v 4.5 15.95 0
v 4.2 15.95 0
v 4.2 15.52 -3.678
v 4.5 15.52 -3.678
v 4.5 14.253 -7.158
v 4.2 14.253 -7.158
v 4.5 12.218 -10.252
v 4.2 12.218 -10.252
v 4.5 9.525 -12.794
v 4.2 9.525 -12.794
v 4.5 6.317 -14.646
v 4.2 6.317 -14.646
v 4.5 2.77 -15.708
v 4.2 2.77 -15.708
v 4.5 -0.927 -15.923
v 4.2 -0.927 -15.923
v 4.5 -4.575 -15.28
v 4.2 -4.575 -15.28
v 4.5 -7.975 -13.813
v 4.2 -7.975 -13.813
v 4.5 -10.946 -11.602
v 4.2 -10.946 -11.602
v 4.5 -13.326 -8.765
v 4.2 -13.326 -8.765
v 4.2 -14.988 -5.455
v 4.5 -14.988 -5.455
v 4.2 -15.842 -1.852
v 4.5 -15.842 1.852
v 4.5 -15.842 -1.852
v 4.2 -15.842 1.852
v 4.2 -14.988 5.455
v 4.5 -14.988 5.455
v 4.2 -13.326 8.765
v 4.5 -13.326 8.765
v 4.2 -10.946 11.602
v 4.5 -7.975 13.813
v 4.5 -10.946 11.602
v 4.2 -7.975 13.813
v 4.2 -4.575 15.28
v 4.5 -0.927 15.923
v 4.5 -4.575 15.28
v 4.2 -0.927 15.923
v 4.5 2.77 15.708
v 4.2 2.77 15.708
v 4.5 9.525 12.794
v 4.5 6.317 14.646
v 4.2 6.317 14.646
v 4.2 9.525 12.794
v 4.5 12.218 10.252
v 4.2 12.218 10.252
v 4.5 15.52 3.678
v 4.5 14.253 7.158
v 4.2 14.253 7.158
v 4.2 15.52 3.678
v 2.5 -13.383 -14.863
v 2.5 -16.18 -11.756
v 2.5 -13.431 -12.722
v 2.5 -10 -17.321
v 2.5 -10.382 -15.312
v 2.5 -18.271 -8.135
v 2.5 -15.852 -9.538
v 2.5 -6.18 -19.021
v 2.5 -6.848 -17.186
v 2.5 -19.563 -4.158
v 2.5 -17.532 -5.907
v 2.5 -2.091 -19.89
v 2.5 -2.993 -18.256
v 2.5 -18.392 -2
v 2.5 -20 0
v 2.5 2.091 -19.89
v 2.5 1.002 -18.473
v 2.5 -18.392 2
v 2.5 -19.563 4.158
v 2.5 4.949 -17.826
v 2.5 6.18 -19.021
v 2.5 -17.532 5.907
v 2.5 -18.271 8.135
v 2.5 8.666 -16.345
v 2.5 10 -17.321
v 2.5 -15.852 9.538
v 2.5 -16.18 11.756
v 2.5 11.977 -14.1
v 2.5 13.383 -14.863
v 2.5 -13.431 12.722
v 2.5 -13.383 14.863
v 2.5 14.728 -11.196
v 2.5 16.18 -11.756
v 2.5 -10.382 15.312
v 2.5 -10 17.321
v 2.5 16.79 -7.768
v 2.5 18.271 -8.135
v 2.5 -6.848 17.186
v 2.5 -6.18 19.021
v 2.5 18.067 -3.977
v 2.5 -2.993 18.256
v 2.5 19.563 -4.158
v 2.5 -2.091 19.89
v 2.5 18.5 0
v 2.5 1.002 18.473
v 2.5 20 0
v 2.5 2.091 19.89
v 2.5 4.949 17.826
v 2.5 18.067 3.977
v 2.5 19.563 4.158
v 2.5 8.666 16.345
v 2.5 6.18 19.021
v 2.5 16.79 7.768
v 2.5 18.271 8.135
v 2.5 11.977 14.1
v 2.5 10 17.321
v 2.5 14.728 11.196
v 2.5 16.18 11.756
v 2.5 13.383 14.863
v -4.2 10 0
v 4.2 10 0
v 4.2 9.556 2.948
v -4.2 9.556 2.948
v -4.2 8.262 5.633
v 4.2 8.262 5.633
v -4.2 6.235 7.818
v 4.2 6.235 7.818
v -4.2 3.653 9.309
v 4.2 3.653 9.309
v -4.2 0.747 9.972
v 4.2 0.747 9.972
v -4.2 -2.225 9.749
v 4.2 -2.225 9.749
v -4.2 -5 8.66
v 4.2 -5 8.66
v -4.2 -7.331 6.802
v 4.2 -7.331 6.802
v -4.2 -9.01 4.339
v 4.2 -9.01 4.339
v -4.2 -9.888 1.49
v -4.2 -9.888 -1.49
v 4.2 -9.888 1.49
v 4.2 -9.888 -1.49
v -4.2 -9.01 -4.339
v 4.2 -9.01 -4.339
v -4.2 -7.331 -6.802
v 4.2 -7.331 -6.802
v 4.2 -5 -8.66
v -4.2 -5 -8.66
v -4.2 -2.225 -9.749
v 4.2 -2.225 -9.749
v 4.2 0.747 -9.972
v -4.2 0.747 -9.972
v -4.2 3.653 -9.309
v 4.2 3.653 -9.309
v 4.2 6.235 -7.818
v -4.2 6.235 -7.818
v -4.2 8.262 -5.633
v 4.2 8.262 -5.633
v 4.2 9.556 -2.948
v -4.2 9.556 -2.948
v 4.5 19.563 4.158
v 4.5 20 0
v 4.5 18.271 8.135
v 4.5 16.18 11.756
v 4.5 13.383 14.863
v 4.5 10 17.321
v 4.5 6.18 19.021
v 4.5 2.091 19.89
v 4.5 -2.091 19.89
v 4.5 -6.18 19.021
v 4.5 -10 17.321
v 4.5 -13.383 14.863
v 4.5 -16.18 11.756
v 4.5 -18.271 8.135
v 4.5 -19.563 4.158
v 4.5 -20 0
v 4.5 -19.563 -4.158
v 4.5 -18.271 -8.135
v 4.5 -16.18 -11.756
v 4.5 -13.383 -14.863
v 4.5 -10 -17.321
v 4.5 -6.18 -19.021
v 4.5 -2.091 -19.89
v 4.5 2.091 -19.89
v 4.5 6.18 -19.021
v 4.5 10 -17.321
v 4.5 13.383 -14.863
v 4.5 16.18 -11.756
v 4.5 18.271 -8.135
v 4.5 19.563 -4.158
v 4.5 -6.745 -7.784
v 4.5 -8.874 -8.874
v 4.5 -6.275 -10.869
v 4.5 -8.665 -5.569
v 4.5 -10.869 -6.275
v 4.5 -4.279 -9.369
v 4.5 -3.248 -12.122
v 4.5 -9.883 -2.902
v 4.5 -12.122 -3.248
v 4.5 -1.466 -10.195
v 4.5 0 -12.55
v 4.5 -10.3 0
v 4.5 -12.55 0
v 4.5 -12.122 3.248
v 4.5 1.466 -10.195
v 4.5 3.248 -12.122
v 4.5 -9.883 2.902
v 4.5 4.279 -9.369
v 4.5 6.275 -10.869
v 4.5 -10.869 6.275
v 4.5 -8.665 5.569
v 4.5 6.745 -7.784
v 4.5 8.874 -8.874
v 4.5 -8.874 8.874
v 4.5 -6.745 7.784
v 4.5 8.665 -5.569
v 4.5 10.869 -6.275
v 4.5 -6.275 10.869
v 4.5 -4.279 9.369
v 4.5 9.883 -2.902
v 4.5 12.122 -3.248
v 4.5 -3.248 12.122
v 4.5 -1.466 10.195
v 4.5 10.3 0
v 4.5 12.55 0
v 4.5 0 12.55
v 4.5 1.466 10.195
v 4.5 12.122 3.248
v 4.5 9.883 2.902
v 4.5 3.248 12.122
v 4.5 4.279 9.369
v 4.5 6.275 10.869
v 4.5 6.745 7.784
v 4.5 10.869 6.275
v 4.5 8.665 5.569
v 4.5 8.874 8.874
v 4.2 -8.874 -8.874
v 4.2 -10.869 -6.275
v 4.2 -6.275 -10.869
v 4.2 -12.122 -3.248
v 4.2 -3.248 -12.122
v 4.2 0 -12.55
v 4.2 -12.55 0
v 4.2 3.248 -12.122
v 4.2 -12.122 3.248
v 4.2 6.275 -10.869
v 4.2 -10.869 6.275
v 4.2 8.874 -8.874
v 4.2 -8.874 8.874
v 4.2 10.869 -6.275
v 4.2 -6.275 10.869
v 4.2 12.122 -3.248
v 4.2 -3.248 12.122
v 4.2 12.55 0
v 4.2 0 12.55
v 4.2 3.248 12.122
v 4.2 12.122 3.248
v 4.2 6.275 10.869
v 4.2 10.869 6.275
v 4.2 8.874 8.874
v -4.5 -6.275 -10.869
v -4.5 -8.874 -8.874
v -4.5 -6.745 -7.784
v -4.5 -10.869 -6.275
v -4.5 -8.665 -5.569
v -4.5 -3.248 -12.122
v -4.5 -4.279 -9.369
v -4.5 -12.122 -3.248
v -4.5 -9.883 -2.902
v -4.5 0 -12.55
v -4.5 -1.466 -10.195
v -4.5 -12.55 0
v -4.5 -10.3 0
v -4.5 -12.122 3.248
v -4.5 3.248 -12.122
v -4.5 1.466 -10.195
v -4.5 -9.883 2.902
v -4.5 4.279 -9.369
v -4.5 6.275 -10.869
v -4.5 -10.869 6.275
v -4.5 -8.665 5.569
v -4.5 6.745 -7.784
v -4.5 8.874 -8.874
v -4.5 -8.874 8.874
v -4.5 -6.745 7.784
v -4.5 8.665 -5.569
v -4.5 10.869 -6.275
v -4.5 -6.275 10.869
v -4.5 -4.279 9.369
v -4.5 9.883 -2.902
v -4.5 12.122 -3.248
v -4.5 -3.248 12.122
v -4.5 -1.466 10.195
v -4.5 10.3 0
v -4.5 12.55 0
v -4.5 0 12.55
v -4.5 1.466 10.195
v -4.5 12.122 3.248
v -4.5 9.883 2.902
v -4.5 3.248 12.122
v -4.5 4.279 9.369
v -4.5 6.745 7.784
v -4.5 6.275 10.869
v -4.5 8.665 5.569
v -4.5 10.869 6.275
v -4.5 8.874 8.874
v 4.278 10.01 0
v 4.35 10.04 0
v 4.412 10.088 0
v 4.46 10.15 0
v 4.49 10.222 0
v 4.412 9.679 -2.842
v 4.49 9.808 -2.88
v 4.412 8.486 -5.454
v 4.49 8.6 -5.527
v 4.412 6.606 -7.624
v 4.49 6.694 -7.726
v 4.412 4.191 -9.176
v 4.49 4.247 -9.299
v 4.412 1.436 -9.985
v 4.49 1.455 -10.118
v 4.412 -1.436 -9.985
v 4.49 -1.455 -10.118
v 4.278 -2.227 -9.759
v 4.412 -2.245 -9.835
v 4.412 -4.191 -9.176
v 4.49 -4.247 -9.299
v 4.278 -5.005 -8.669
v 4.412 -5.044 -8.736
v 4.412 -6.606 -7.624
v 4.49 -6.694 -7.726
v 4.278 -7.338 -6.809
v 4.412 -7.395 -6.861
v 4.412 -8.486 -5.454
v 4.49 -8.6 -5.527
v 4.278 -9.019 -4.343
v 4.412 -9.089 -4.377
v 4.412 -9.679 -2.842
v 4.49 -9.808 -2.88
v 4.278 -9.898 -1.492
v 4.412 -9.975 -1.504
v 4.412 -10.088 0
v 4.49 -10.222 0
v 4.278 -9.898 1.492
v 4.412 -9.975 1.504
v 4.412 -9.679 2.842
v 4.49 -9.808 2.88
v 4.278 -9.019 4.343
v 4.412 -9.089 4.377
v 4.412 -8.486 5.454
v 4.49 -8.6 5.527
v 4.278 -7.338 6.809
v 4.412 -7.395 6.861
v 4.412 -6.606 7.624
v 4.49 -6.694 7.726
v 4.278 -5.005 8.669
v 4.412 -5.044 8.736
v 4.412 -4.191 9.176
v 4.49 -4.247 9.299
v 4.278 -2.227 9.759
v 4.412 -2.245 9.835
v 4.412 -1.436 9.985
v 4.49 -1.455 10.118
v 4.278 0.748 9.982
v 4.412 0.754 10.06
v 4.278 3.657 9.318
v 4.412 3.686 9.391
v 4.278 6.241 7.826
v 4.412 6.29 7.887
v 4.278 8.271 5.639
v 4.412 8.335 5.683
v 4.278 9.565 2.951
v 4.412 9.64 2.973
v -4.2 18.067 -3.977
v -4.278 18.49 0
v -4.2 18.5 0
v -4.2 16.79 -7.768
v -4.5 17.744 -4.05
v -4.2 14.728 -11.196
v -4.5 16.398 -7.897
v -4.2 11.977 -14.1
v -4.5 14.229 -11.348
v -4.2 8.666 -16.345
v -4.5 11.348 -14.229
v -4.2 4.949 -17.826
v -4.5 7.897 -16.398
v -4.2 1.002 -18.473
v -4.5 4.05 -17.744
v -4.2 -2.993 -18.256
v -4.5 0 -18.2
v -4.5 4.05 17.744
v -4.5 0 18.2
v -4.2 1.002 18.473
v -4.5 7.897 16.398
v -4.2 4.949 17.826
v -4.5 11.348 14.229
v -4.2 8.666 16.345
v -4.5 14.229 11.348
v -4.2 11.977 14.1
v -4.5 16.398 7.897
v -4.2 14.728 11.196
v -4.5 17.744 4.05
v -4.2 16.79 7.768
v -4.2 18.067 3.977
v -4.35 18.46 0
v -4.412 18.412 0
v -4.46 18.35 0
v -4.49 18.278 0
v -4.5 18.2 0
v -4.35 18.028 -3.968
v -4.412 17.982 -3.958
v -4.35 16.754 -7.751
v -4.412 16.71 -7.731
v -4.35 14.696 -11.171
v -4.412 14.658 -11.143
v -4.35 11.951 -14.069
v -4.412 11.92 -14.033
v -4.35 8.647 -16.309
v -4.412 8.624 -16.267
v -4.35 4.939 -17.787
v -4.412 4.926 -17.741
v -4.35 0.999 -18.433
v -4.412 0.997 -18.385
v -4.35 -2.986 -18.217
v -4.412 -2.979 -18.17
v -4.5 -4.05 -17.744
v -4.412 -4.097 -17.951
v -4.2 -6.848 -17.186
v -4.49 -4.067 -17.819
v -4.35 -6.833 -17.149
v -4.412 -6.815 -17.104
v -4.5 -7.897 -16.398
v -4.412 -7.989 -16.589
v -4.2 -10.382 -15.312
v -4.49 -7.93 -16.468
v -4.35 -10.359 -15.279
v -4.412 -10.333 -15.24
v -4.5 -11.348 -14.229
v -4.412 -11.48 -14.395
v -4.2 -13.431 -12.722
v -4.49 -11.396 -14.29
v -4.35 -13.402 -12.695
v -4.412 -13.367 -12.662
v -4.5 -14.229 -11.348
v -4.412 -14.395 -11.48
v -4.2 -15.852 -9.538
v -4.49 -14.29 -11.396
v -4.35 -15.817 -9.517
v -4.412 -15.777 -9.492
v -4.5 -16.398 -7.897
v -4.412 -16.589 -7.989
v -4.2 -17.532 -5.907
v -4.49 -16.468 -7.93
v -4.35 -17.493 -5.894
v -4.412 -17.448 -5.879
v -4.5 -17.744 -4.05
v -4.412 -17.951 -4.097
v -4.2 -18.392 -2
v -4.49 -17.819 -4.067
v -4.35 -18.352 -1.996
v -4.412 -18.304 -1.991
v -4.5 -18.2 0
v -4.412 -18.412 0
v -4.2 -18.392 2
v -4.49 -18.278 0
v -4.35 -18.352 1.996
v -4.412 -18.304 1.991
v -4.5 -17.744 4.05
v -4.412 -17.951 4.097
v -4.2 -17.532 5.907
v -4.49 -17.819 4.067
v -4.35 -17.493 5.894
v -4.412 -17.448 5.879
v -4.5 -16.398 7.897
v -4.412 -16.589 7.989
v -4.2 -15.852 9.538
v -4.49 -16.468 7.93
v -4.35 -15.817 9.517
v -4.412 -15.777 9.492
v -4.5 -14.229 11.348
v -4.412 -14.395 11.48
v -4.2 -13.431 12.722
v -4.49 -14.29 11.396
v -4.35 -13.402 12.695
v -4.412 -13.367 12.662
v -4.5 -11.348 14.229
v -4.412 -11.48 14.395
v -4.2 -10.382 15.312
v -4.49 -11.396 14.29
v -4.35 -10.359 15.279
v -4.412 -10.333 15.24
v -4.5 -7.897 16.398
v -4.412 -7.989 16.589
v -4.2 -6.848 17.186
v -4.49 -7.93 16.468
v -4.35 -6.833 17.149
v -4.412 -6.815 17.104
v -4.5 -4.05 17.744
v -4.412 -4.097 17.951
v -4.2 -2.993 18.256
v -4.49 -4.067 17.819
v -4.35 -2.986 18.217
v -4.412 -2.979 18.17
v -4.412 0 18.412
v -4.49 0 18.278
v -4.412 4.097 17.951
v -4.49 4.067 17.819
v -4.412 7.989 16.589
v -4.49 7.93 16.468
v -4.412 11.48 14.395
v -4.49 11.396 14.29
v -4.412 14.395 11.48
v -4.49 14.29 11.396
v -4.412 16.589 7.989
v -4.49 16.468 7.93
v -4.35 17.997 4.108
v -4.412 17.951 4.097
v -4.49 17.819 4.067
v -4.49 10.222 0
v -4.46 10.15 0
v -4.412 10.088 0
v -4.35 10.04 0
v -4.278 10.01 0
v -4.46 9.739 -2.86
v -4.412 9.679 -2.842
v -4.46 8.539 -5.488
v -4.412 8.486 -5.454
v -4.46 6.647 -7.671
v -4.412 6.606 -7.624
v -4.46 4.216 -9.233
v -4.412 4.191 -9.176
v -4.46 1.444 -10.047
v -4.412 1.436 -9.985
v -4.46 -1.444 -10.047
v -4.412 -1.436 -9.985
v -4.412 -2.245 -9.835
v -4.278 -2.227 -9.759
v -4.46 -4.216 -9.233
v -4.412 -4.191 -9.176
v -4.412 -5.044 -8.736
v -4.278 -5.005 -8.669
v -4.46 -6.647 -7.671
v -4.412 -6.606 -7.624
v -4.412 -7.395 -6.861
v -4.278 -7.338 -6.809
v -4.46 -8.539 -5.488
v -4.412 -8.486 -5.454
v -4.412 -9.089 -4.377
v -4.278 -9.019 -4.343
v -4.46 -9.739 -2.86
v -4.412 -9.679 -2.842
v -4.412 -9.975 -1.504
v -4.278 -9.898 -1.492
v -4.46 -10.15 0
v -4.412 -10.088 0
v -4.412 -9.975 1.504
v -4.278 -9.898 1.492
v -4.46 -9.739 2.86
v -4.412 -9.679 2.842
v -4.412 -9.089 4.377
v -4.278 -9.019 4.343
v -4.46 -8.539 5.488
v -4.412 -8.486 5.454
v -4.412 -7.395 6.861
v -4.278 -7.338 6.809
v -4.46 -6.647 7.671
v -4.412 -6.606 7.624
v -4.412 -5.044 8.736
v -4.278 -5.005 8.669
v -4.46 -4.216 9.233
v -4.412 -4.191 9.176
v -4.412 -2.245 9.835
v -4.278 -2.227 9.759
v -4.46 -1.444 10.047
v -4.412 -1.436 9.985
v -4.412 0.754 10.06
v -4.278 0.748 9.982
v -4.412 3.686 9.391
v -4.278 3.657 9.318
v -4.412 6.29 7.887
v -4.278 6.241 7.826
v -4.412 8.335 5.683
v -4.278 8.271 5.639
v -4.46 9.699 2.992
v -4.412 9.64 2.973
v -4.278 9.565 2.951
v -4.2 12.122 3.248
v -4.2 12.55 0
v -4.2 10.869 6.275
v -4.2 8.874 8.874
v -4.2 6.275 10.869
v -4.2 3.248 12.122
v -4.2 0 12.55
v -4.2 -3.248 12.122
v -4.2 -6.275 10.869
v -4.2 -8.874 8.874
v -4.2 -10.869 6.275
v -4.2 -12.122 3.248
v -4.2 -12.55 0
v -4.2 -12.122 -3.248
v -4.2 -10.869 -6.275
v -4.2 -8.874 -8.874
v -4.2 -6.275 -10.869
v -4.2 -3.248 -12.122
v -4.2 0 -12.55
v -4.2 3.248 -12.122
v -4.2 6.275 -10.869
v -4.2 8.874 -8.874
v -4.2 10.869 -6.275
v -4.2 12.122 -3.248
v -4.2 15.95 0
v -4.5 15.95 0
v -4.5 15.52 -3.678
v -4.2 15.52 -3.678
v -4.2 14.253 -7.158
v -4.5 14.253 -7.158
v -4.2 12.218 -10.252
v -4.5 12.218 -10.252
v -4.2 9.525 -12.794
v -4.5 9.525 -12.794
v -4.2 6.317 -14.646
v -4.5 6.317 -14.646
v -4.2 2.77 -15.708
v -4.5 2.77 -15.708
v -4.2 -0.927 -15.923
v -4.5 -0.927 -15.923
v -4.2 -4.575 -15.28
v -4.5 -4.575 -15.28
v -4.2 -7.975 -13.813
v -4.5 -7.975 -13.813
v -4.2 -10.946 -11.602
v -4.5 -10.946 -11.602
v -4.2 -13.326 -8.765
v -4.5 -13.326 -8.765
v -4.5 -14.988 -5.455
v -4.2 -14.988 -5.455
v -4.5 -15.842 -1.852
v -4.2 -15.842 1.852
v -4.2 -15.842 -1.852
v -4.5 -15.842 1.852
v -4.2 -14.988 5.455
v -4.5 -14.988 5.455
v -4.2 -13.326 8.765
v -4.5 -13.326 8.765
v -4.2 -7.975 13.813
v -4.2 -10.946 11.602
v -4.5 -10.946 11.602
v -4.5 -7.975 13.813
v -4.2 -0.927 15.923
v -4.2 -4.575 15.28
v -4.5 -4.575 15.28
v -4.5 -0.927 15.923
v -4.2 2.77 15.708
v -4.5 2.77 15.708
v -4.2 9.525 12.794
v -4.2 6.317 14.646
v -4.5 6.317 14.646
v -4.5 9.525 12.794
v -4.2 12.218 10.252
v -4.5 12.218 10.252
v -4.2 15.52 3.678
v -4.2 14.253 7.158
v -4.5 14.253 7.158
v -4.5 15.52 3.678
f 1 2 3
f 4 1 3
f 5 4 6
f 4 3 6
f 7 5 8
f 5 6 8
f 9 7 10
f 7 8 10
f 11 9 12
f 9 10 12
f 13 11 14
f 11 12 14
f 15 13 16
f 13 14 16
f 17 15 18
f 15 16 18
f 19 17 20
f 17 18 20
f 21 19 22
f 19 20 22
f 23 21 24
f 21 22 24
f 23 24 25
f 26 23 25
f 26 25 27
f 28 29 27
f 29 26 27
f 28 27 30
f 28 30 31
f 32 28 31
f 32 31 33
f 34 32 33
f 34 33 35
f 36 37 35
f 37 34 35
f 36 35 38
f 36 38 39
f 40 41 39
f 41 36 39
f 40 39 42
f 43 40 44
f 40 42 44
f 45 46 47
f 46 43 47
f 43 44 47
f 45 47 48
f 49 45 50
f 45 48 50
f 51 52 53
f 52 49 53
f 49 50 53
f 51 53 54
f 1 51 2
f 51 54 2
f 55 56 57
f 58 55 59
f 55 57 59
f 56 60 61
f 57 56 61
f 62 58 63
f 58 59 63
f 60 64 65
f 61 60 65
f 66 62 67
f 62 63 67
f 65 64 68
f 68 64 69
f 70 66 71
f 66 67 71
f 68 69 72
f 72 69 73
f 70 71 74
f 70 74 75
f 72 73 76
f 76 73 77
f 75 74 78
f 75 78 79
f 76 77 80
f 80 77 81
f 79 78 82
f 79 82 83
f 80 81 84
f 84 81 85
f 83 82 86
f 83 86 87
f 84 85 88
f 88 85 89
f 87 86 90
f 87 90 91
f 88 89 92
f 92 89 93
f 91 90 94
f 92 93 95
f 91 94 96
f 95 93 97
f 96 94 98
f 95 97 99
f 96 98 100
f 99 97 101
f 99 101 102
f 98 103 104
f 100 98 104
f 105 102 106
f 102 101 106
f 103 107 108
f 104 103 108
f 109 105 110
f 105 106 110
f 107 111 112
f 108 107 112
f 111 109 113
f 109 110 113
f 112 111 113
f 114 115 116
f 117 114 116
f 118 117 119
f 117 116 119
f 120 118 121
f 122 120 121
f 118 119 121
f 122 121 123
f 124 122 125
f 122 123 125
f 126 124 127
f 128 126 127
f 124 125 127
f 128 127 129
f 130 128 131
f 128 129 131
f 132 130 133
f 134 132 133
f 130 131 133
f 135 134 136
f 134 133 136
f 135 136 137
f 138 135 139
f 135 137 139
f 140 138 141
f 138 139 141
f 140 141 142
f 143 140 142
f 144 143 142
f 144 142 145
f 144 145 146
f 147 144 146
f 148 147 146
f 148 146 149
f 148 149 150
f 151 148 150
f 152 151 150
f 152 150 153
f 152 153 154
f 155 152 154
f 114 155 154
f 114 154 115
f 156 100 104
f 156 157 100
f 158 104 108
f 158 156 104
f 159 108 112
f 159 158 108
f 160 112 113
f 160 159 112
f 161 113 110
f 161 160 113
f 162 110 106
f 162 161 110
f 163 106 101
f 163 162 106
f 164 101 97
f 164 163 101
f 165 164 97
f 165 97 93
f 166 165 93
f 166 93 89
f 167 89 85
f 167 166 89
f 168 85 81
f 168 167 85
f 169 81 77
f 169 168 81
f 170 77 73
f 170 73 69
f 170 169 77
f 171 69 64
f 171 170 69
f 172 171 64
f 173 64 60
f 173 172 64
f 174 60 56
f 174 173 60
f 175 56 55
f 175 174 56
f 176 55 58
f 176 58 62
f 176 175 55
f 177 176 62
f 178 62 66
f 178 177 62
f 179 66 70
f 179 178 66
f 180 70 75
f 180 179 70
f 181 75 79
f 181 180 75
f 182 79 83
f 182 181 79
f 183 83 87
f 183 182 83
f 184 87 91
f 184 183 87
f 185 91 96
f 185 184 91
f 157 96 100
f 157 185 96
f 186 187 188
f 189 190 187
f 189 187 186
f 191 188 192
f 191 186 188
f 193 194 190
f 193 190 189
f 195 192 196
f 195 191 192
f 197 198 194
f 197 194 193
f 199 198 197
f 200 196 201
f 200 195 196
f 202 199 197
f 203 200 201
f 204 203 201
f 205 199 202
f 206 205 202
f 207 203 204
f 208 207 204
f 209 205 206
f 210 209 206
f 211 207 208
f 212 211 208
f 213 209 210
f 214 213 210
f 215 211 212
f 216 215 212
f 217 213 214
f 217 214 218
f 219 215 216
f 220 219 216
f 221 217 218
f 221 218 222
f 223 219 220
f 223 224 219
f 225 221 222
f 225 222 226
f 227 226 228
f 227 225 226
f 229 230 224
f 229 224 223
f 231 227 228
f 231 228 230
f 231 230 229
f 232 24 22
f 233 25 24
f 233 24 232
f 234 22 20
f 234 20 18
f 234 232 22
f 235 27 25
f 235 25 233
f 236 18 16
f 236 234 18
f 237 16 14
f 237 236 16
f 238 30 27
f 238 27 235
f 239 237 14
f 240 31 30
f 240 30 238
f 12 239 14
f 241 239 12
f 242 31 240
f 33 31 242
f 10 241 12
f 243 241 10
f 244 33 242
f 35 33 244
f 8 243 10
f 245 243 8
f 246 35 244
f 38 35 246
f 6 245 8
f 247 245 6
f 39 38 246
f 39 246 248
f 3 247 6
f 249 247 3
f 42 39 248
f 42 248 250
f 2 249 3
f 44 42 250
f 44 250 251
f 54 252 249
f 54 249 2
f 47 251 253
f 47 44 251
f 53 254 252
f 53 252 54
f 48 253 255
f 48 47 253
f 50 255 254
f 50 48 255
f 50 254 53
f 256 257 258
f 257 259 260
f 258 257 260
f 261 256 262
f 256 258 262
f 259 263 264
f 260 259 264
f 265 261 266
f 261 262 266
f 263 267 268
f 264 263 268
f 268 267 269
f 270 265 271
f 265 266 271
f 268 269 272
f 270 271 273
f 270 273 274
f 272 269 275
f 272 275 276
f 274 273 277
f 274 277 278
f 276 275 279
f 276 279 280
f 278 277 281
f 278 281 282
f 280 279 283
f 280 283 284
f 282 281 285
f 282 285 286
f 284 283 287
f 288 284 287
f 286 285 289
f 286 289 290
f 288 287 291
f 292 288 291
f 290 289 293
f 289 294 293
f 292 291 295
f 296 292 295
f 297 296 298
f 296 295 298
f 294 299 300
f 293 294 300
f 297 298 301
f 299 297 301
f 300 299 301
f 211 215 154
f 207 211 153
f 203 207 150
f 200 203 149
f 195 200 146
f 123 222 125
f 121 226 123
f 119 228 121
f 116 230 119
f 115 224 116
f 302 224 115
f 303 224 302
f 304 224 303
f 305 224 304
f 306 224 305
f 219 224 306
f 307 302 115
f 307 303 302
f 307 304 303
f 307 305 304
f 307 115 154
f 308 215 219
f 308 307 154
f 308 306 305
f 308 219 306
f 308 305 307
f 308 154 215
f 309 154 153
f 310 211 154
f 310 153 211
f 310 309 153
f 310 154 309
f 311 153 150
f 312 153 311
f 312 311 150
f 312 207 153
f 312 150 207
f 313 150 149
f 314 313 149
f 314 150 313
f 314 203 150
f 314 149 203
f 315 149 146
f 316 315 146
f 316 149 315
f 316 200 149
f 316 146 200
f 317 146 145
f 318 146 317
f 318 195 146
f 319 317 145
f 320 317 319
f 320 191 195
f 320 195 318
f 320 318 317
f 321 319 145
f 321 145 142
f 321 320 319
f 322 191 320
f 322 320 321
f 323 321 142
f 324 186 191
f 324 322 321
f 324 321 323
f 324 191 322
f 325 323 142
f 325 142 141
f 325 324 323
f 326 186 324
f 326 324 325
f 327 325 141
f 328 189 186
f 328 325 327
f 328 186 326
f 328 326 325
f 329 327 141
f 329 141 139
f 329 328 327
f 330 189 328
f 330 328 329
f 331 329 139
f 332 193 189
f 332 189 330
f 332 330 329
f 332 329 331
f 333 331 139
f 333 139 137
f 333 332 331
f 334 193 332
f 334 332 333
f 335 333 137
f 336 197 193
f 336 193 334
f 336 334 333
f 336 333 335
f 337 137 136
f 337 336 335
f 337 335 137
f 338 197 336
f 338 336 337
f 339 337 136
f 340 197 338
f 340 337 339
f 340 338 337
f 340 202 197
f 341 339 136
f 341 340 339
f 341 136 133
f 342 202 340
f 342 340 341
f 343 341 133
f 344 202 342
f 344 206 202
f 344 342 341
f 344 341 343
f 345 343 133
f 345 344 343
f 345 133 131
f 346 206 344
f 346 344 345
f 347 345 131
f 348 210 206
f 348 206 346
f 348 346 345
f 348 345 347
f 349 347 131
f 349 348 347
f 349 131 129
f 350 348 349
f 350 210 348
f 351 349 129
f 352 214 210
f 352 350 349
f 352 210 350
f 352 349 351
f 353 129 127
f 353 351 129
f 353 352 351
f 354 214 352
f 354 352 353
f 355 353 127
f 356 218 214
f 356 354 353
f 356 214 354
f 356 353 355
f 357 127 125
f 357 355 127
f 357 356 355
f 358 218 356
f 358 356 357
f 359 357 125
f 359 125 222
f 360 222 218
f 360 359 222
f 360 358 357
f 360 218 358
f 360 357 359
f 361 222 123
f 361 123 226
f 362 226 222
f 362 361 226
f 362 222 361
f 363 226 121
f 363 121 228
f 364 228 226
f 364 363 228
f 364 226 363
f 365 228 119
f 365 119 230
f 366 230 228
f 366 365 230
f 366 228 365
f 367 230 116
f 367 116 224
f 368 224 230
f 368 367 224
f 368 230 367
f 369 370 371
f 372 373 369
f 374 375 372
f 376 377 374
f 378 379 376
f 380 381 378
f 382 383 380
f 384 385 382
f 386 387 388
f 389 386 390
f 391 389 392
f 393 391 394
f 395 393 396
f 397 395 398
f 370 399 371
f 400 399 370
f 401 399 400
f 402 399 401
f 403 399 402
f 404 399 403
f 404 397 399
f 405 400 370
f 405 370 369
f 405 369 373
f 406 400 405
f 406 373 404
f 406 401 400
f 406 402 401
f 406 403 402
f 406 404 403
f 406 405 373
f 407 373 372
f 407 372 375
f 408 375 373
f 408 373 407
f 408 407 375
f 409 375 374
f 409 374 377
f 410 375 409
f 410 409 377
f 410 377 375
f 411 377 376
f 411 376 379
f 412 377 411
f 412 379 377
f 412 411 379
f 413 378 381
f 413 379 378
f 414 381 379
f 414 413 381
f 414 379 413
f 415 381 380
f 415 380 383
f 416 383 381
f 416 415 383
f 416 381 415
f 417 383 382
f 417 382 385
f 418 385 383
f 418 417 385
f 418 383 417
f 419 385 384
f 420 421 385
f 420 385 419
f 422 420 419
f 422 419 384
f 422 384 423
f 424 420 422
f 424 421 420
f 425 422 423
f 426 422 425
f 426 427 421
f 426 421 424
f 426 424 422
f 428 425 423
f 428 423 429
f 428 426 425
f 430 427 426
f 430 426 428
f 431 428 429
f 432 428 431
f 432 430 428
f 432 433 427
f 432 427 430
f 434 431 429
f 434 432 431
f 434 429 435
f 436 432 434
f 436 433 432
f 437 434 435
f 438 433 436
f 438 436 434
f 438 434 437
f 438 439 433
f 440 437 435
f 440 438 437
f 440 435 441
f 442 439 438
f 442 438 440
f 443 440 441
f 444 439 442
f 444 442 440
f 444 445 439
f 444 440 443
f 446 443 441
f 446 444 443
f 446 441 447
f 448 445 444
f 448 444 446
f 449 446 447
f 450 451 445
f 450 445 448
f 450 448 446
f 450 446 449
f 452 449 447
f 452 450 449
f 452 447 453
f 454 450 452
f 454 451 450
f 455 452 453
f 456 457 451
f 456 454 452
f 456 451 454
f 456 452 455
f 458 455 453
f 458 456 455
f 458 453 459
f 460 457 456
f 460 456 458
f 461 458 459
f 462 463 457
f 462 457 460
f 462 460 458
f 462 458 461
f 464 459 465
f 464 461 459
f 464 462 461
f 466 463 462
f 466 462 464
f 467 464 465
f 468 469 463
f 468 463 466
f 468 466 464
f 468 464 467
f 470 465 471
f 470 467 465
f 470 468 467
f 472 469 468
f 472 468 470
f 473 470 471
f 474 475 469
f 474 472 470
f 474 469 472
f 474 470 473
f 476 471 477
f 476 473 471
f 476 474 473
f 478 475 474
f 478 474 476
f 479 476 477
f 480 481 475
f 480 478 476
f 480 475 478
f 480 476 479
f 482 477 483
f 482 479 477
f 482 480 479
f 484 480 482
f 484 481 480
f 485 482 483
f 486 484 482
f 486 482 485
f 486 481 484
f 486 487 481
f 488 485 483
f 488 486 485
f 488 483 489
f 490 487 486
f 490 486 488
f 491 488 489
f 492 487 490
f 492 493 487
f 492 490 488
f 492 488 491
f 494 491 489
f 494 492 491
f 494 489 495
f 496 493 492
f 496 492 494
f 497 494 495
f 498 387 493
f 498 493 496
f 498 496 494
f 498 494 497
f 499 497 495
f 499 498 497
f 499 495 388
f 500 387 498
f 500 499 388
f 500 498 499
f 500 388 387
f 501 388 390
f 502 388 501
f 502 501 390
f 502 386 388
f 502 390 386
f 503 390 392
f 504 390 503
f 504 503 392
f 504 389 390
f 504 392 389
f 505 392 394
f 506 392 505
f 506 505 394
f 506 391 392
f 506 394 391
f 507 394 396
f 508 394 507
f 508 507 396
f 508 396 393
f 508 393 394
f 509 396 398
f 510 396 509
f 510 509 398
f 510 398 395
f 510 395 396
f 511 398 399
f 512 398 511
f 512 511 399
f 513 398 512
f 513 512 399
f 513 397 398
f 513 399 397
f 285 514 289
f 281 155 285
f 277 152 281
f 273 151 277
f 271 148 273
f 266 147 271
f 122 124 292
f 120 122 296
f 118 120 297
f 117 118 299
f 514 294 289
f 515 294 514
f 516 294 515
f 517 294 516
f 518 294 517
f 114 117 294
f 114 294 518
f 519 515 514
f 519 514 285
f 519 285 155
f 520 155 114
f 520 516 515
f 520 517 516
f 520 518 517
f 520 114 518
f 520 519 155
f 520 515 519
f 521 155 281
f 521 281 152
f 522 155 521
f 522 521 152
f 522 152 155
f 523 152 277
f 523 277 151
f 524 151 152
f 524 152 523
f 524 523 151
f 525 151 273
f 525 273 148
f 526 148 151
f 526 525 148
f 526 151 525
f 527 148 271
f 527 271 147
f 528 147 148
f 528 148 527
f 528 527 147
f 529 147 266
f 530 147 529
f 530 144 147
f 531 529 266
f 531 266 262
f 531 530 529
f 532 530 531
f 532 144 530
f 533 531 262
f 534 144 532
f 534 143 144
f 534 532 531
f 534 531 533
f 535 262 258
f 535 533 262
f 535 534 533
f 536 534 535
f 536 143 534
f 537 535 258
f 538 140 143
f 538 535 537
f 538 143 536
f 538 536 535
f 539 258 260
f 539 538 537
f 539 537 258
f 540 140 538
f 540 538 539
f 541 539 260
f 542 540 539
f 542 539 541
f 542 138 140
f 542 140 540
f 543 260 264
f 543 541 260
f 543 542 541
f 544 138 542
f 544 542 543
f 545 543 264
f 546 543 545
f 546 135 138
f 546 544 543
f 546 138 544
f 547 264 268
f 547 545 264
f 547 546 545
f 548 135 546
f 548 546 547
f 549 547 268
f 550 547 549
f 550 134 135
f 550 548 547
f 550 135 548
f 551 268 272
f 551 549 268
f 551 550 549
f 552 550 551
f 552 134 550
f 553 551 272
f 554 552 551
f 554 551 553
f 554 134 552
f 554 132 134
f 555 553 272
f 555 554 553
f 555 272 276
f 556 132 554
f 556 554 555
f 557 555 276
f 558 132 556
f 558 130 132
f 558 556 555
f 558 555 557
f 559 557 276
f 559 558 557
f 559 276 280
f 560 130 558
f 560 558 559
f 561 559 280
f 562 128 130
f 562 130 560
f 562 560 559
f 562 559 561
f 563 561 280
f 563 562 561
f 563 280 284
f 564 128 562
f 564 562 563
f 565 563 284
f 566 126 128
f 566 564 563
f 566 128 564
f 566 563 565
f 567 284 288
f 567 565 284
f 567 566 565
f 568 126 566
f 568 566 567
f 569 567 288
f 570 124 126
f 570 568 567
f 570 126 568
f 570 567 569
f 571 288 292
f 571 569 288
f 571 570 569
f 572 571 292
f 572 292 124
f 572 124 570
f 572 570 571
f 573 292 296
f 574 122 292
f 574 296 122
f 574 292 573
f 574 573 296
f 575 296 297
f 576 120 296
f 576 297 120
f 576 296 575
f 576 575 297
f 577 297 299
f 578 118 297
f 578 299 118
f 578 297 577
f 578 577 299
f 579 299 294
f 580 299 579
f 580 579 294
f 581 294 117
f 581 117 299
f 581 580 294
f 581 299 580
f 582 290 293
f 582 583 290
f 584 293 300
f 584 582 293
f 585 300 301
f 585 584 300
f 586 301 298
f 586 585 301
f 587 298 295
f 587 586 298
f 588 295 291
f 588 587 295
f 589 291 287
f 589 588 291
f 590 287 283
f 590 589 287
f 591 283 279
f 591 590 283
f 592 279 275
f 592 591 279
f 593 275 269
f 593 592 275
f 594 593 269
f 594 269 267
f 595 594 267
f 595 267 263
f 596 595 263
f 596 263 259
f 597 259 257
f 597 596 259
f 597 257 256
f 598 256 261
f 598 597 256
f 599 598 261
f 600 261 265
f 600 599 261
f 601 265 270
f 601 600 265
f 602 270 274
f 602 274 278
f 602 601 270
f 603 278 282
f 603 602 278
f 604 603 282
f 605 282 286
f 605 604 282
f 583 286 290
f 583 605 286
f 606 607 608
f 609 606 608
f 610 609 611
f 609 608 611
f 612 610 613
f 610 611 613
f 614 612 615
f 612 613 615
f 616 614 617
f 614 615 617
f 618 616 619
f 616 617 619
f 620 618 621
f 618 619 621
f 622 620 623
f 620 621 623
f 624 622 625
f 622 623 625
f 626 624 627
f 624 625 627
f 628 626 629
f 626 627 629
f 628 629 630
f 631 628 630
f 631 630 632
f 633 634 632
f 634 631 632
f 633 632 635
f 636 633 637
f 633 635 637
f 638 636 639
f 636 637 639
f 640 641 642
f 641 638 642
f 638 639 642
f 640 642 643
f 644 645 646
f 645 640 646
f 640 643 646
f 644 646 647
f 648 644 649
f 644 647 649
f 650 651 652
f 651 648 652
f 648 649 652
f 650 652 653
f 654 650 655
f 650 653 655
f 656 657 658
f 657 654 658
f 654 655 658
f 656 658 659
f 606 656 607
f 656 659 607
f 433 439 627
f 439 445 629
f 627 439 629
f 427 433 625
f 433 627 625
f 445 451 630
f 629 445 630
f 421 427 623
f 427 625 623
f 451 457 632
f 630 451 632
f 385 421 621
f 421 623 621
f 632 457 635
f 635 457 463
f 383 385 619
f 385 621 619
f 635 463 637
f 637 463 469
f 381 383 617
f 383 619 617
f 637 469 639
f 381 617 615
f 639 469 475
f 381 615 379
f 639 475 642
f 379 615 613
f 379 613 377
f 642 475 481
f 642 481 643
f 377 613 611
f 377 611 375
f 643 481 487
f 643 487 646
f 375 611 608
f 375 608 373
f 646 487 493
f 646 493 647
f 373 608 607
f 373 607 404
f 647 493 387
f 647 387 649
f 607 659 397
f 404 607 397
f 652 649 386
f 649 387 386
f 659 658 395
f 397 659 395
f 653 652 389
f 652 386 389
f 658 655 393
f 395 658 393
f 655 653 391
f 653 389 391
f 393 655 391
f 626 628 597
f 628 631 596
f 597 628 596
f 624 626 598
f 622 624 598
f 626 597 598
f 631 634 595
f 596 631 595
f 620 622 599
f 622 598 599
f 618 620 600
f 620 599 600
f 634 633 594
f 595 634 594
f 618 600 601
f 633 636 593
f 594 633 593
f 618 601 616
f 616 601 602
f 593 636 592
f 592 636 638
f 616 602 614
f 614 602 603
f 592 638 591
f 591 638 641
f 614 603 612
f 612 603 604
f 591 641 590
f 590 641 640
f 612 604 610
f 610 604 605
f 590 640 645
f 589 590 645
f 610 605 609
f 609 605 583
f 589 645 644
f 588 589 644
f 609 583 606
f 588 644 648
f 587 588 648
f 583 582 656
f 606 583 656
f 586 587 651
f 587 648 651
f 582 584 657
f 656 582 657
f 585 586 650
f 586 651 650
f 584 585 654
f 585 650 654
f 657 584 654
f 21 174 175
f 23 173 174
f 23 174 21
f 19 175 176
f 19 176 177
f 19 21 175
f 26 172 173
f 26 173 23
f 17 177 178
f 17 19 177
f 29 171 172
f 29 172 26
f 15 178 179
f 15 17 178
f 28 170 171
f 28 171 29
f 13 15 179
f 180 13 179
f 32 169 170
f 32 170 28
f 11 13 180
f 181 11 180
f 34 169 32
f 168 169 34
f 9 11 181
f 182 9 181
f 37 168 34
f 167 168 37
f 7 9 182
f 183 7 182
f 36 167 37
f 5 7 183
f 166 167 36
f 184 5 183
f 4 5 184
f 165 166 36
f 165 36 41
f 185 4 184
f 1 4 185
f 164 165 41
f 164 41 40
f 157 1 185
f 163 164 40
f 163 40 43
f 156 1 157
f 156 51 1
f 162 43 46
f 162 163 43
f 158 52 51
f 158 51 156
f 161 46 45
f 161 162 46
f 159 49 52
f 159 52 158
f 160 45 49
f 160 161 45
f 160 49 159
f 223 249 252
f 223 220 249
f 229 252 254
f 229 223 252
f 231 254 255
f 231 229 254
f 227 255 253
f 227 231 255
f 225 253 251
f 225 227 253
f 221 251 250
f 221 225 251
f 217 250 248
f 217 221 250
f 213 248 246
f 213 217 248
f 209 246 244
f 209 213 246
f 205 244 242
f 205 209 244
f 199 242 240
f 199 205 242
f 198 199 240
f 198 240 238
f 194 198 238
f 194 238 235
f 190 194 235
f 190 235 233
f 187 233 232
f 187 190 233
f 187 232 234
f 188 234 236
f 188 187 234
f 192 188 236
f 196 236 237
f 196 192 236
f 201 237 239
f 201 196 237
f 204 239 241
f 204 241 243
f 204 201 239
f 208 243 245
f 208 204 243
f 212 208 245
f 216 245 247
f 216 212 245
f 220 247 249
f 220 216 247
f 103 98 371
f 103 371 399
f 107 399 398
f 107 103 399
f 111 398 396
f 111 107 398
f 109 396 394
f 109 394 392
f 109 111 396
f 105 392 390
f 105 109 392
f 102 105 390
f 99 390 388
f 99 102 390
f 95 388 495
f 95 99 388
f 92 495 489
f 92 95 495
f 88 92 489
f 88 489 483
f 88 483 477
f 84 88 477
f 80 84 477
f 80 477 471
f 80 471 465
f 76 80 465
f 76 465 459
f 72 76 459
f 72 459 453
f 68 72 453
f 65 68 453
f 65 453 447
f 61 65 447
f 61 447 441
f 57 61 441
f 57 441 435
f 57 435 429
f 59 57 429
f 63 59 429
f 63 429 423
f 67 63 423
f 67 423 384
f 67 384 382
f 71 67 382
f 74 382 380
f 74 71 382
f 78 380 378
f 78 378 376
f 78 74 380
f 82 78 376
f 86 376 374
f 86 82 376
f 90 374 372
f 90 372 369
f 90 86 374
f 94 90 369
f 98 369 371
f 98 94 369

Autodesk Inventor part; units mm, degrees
ref_plane "YZ Plane" through (0, 0, 0) normal (1, 0, 0) x (0, 1, 0)
ref_plane "XZ Plane" through (0, 0, 0) normal (0, 1, 0) x (-1, 0, 0)
ref_plane "XY Plane" through (0, 0, 0) normal (0, 0, 1) x (1, 0, 0)
sketch "_____1" plane through (0, 0, 0) normal (0, 0, 1) x (1, 0, 0)
  line L0 (50, 0) -> (-50, 0)
  line L1 (-4.5, 0) -> (-4.5, 12.55)
  line L2 (-4.5, 12.55) -> (-4.2, 12.55)
  line L3 (-4.2, 12.55) -> (-4.2, 15.95)
  line L4 (-4.2, 15.95) -> (-4.5, 15.95)
  line L5 (-4.5, 15.95) -> (-4.5, 18.2)
  arc A0 (-4.2, 18.5) -> (-4.5, 18.2) centre (-4.2, 18.2) ccw
  line L6 (-4.2, 18.5) -> (2.5, 18.5)
  line L7 (2.5, 18.5) -> (2.5, 20)
  line L8 (2.5, 20) -> (4.5, 20)
  line L9 (4.5, 20) -> (4.5, 15.95)
  line L10 (4.5, 15.95) -> (4.2, 15.95)
  line L11 (4.2, 15.95) -> (4.2, 12.55)
  line L12 (4.2, 12.55) -> (4.5, 12.55)
  line L13 (4.5, 12.55) -> (4.5, 0)
  line L14 (4.5, 0) -> (-4.5, 0)
revolve "Revolution1" add sketch "_____1" angle 360 about axis through (50, 0, 0) along (1, 0, 0)
sketch "_____2" plane through (0, 0, 0) normal (0, 0, 1) x (1, 0, 0)
  line L0 (50, 0) -> (-50, 0)
  line L1 (-4.5, 0) -> (-4.5, 10.3)
  arc A0 (-4.5, 10.3) -> (-4.2, 10) centre (-4.2, 10.3) ccw
  line L2 (-4.2, 10) -> (4.2, 10)
  arc A1 (4.2, 10) -> (4.5, 10.3) centre (4.2, 10.3) ccw
  line L3 (4.5, 10.3) -> (4.5, 0)
  line L4 (4.5, 0) -> (-4.5, 0)
revolve "Revolution2" cut sketch "_____2" angle 360 about axis through (50, 0, 0) along (1, 0, 0)
properties part number "C-FL6904ZZ" material "ステンレス鋼"
